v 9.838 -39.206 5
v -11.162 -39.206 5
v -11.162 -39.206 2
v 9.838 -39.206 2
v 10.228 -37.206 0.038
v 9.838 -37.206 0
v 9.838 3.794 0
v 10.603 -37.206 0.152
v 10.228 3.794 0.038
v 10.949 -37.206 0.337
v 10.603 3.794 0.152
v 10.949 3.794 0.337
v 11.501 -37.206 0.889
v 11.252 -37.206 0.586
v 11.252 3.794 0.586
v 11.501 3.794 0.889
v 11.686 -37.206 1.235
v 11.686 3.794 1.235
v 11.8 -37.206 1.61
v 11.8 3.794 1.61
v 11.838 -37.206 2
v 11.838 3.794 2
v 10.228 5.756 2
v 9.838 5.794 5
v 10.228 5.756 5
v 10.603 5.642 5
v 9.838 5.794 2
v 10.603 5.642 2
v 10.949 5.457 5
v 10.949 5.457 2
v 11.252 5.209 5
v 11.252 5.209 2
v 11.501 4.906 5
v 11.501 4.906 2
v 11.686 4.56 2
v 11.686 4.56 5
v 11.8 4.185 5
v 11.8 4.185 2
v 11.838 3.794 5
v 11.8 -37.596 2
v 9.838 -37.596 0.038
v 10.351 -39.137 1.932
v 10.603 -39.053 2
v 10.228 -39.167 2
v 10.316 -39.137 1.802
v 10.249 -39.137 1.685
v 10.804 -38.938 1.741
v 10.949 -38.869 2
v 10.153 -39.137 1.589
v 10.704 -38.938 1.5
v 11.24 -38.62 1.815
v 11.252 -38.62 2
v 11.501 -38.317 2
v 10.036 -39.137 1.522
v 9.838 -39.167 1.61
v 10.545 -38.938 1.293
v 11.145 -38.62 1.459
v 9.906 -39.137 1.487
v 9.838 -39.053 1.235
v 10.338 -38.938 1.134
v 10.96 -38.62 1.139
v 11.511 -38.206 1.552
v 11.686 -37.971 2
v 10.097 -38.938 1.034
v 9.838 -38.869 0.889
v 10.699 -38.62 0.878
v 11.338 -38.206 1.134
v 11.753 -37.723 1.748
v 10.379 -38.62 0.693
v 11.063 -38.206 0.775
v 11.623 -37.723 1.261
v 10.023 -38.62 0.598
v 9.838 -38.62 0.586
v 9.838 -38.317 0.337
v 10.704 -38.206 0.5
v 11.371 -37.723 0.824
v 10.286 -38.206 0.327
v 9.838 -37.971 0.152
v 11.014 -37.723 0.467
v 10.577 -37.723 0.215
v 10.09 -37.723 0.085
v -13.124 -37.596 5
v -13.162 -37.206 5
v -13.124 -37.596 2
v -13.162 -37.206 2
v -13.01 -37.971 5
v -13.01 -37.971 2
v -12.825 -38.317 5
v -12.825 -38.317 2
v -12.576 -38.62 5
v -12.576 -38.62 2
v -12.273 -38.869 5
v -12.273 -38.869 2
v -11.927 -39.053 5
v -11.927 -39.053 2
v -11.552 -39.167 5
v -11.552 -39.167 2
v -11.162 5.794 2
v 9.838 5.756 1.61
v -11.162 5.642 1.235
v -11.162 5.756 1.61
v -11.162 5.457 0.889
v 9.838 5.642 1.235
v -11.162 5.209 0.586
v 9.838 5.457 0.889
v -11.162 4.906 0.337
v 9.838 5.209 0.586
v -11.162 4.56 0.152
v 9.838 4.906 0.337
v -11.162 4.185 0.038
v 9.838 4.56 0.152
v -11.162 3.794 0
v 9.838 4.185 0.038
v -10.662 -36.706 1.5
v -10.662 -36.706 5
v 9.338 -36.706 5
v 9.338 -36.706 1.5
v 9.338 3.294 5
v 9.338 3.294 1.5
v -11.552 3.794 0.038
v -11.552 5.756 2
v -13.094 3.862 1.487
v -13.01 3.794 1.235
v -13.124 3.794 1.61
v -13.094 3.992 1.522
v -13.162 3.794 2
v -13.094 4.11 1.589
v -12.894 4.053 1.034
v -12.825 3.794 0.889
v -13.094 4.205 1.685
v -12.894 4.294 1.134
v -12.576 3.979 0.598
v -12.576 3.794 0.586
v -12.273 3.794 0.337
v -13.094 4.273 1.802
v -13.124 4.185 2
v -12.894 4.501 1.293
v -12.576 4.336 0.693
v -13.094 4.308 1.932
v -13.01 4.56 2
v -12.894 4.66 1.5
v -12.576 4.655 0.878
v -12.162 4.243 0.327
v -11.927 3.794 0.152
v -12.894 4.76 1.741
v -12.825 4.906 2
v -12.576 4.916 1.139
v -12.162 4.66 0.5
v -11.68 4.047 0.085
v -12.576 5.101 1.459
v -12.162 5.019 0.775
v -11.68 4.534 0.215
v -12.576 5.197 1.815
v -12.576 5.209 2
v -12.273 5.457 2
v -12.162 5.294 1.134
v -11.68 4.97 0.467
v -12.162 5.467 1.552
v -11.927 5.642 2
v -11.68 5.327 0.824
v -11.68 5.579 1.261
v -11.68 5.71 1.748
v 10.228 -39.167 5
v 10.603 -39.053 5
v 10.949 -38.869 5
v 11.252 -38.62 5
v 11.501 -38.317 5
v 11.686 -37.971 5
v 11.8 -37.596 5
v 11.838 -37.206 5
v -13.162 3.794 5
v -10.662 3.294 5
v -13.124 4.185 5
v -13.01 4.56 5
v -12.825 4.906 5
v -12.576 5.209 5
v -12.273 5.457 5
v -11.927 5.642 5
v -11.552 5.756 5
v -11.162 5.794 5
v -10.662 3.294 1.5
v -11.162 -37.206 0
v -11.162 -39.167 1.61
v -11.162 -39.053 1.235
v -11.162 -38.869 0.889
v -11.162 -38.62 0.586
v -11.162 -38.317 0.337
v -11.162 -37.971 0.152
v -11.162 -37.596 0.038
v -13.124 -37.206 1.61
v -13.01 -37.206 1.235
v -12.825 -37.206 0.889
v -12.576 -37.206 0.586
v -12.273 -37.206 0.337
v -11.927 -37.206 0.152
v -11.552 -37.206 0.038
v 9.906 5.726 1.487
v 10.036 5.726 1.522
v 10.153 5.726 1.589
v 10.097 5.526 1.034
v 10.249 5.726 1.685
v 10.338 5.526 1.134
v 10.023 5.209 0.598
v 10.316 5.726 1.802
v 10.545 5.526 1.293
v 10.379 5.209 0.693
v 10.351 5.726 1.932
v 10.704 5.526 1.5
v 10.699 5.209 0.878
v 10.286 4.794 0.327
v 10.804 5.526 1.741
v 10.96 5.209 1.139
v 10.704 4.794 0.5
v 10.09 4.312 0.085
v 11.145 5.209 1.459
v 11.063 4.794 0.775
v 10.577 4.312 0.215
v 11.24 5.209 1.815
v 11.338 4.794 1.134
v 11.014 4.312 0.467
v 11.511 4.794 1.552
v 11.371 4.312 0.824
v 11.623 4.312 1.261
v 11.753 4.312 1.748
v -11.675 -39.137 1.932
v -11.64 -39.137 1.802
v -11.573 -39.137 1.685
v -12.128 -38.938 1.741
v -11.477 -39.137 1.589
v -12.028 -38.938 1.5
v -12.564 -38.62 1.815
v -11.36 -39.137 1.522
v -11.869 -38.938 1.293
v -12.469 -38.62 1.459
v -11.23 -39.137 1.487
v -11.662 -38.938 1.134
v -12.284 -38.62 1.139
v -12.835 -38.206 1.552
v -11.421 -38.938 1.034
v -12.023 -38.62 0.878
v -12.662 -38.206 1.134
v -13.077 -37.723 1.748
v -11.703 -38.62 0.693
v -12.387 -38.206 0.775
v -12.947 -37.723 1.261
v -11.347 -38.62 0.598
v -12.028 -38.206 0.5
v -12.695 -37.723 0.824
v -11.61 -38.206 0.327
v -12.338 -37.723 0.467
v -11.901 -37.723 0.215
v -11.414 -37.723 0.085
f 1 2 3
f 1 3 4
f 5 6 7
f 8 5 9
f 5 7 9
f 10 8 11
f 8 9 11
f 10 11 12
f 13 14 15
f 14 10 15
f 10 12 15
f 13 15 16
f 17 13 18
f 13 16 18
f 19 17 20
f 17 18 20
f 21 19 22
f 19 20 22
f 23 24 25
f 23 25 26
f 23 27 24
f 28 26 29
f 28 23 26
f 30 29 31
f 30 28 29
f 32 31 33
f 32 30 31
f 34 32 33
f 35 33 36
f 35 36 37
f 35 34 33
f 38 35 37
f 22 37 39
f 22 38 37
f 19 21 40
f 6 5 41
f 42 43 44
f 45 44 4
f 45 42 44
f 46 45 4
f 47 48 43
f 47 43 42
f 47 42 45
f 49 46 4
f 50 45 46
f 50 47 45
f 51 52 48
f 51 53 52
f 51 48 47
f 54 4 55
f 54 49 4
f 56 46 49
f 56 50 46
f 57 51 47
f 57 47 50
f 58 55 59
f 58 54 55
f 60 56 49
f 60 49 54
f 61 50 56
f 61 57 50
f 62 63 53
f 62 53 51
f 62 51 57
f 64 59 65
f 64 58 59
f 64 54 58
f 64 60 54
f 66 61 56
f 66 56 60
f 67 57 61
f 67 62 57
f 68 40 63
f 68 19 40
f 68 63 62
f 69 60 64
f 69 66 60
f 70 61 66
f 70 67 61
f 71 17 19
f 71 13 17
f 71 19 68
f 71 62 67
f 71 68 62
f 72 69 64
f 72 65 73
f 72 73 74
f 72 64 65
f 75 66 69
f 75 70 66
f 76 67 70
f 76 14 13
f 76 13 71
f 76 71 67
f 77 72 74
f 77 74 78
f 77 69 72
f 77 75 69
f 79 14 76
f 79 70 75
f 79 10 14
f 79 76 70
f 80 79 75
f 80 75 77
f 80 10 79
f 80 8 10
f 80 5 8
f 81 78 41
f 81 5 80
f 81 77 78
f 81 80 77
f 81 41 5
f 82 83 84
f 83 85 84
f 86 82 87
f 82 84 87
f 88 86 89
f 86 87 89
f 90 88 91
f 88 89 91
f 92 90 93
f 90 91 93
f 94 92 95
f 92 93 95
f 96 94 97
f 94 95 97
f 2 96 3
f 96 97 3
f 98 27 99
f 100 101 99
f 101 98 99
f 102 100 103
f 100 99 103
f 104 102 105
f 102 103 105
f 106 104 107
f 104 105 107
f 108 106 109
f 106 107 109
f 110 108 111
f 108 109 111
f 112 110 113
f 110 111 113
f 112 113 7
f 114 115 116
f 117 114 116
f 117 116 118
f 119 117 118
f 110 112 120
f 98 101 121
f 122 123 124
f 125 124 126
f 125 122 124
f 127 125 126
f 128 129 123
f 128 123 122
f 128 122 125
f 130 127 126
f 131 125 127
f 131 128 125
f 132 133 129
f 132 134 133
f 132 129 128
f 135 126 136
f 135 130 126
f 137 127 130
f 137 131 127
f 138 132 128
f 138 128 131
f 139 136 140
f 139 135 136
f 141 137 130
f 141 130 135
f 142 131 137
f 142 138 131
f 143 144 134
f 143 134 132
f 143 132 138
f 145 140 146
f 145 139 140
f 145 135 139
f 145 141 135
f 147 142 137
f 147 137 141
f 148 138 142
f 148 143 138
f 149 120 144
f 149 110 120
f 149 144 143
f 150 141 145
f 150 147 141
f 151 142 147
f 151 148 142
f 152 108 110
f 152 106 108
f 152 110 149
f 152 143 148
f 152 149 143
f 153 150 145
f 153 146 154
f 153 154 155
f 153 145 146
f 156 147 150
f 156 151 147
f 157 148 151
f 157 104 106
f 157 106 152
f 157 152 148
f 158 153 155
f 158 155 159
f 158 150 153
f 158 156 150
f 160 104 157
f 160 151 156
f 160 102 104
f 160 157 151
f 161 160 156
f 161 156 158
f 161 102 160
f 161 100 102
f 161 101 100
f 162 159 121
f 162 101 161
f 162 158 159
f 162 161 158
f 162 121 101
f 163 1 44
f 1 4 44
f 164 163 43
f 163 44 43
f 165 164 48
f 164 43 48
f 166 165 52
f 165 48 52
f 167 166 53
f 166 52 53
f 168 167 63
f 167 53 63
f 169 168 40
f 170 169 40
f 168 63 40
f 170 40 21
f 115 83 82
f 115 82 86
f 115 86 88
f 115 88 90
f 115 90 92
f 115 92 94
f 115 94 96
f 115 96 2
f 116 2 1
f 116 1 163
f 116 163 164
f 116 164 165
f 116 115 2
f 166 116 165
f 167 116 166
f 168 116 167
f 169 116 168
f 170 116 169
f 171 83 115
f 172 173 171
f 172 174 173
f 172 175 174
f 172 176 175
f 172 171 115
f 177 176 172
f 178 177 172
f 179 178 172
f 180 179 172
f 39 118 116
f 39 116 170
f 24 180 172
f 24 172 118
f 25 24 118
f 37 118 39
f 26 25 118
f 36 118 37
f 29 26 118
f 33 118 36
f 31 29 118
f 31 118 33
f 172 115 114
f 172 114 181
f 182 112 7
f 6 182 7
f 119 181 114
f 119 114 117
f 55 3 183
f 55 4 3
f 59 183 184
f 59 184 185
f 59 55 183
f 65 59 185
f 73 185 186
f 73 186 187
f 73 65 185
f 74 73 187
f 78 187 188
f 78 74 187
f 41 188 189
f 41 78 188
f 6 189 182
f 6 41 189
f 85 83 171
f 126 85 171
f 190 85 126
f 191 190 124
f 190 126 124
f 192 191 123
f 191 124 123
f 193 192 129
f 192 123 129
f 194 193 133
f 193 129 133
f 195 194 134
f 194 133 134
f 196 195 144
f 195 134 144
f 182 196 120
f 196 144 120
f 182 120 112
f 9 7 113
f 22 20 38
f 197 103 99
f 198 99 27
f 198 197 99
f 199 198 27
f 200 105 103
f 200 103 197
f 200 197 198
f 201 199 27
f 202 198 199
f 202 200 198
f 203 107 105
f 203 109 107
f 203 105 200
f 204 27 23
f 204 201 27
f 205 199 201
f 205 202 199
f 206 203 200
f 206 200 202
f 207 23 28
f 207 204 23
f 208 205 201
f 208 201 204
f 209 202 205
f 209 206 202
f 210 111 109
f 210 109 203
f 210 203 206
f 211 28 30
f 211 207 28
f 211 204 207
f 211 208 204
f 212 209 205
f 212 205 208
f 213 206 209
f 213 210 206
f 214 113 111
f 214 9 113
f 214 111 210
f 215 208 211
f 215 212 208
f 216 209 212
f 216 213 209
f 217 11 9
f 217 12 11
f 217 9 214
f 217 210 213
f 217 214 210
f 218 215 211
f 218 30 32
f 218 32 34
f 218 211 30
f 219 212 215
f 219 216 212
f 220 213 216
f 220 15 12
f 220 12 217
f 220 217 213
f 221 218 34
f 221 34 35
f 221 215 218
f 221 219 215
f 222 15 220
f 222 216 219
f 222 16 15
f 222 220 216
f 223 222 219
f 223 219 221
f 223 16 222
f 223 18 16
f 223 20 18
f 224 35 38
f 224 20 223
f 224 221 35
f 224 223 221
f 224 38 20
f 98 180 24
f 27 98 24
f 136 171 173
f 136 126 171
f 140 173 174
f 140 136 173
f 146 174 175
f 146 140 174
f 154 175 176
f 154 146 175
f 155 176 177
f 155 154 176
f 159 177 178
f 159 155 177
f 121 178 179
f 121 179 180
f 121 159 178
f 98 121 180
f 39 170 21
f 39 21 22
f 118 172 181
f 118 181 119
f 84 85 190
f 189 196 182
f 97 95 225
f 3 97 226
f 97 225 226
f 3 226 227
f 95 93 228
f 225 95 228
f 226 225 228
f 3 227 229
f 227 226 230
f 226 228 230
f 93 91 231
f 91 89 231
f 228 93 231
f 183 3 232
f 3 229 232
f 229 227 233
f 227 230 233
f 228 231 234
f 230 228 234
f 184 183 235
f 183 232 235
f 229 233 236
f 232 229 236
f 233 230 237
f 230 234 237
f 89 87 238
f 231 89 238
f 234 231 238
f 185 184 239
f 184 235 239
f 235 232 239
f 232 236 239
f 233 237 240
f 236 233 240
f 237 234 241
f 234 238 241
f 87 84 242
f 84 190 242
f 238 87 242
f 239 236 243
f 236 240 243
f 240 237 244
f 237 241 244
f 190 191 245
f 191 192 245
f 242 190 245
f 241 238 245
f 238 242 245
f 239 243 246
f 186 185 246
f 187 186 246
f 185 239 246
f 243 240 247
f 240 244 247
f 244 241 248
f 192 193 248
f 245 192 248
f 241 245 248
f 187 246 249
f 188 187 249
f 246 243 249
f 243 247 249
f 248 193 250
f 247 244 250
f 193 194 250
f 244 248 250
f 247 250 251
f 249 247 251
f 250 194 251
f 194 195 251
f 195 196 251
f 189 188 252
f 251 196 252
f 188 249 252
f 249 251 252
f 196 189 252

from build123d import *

# Parameters (mm, degrees)
IZIM1_W                     = 25
IZIM1_H                     = 45
Y_KSEKLIK_EKSTR_ZYON1_DEPTH = 5
IZIM2_W                     = 20
IZIM2_H                     = 40
KES_EKSTR_ZYON1_DEPTH       = 3.5
RADYUS1_R                   = 2


with BuildPart() as part:
    # Çizim1 → Yükseklik-Ekstrüzyon1 (new body)
    with BuildSketch(Plane.XY.offset(5)):
        with Locations((-0.661993769, -16.705607477)):
            Rectangle(IZIM1_W, IZIM1_H)
    extrude(amount=-Y_KSEKLIK_EKSTR_ZYON1_DEPTH)

    # Çizim2 → Kes-Ekstrüzyon1 (cut)
    with BuildSketch(Plane.XY.offset(5)):
        with Locations((-0.661993769, -16.705607477)):
            Rectangle(IZIM2_W, IZIM2_H)
    extrude(amount=-KES_EKSTR_ZYON1_DEPTH, mode=Mode.SUBTRACT)

    # Radyus1
    radyus1_edges = [part.edges().sort_by_distance(p)[0] for p in [
        (11.838006231, -16.705607477, 0),
        (-0.661993769, 5.794392523, 0),
        (-13.161993769, -16.705607477, 0),
        (-13.161993769, 5.794392523, 2.5),
        (11.838006231, 5.794392523, 2.5),
        (11.838006231, -39.205607477, 2.5),
        (-13.161993769, -39.205607477, 2.5),
        (-0.661993769, -39.205607477, 0),
    ]]
    fillet(radyus1_edges, radius=RADYUS1_R)


solid = part.part
